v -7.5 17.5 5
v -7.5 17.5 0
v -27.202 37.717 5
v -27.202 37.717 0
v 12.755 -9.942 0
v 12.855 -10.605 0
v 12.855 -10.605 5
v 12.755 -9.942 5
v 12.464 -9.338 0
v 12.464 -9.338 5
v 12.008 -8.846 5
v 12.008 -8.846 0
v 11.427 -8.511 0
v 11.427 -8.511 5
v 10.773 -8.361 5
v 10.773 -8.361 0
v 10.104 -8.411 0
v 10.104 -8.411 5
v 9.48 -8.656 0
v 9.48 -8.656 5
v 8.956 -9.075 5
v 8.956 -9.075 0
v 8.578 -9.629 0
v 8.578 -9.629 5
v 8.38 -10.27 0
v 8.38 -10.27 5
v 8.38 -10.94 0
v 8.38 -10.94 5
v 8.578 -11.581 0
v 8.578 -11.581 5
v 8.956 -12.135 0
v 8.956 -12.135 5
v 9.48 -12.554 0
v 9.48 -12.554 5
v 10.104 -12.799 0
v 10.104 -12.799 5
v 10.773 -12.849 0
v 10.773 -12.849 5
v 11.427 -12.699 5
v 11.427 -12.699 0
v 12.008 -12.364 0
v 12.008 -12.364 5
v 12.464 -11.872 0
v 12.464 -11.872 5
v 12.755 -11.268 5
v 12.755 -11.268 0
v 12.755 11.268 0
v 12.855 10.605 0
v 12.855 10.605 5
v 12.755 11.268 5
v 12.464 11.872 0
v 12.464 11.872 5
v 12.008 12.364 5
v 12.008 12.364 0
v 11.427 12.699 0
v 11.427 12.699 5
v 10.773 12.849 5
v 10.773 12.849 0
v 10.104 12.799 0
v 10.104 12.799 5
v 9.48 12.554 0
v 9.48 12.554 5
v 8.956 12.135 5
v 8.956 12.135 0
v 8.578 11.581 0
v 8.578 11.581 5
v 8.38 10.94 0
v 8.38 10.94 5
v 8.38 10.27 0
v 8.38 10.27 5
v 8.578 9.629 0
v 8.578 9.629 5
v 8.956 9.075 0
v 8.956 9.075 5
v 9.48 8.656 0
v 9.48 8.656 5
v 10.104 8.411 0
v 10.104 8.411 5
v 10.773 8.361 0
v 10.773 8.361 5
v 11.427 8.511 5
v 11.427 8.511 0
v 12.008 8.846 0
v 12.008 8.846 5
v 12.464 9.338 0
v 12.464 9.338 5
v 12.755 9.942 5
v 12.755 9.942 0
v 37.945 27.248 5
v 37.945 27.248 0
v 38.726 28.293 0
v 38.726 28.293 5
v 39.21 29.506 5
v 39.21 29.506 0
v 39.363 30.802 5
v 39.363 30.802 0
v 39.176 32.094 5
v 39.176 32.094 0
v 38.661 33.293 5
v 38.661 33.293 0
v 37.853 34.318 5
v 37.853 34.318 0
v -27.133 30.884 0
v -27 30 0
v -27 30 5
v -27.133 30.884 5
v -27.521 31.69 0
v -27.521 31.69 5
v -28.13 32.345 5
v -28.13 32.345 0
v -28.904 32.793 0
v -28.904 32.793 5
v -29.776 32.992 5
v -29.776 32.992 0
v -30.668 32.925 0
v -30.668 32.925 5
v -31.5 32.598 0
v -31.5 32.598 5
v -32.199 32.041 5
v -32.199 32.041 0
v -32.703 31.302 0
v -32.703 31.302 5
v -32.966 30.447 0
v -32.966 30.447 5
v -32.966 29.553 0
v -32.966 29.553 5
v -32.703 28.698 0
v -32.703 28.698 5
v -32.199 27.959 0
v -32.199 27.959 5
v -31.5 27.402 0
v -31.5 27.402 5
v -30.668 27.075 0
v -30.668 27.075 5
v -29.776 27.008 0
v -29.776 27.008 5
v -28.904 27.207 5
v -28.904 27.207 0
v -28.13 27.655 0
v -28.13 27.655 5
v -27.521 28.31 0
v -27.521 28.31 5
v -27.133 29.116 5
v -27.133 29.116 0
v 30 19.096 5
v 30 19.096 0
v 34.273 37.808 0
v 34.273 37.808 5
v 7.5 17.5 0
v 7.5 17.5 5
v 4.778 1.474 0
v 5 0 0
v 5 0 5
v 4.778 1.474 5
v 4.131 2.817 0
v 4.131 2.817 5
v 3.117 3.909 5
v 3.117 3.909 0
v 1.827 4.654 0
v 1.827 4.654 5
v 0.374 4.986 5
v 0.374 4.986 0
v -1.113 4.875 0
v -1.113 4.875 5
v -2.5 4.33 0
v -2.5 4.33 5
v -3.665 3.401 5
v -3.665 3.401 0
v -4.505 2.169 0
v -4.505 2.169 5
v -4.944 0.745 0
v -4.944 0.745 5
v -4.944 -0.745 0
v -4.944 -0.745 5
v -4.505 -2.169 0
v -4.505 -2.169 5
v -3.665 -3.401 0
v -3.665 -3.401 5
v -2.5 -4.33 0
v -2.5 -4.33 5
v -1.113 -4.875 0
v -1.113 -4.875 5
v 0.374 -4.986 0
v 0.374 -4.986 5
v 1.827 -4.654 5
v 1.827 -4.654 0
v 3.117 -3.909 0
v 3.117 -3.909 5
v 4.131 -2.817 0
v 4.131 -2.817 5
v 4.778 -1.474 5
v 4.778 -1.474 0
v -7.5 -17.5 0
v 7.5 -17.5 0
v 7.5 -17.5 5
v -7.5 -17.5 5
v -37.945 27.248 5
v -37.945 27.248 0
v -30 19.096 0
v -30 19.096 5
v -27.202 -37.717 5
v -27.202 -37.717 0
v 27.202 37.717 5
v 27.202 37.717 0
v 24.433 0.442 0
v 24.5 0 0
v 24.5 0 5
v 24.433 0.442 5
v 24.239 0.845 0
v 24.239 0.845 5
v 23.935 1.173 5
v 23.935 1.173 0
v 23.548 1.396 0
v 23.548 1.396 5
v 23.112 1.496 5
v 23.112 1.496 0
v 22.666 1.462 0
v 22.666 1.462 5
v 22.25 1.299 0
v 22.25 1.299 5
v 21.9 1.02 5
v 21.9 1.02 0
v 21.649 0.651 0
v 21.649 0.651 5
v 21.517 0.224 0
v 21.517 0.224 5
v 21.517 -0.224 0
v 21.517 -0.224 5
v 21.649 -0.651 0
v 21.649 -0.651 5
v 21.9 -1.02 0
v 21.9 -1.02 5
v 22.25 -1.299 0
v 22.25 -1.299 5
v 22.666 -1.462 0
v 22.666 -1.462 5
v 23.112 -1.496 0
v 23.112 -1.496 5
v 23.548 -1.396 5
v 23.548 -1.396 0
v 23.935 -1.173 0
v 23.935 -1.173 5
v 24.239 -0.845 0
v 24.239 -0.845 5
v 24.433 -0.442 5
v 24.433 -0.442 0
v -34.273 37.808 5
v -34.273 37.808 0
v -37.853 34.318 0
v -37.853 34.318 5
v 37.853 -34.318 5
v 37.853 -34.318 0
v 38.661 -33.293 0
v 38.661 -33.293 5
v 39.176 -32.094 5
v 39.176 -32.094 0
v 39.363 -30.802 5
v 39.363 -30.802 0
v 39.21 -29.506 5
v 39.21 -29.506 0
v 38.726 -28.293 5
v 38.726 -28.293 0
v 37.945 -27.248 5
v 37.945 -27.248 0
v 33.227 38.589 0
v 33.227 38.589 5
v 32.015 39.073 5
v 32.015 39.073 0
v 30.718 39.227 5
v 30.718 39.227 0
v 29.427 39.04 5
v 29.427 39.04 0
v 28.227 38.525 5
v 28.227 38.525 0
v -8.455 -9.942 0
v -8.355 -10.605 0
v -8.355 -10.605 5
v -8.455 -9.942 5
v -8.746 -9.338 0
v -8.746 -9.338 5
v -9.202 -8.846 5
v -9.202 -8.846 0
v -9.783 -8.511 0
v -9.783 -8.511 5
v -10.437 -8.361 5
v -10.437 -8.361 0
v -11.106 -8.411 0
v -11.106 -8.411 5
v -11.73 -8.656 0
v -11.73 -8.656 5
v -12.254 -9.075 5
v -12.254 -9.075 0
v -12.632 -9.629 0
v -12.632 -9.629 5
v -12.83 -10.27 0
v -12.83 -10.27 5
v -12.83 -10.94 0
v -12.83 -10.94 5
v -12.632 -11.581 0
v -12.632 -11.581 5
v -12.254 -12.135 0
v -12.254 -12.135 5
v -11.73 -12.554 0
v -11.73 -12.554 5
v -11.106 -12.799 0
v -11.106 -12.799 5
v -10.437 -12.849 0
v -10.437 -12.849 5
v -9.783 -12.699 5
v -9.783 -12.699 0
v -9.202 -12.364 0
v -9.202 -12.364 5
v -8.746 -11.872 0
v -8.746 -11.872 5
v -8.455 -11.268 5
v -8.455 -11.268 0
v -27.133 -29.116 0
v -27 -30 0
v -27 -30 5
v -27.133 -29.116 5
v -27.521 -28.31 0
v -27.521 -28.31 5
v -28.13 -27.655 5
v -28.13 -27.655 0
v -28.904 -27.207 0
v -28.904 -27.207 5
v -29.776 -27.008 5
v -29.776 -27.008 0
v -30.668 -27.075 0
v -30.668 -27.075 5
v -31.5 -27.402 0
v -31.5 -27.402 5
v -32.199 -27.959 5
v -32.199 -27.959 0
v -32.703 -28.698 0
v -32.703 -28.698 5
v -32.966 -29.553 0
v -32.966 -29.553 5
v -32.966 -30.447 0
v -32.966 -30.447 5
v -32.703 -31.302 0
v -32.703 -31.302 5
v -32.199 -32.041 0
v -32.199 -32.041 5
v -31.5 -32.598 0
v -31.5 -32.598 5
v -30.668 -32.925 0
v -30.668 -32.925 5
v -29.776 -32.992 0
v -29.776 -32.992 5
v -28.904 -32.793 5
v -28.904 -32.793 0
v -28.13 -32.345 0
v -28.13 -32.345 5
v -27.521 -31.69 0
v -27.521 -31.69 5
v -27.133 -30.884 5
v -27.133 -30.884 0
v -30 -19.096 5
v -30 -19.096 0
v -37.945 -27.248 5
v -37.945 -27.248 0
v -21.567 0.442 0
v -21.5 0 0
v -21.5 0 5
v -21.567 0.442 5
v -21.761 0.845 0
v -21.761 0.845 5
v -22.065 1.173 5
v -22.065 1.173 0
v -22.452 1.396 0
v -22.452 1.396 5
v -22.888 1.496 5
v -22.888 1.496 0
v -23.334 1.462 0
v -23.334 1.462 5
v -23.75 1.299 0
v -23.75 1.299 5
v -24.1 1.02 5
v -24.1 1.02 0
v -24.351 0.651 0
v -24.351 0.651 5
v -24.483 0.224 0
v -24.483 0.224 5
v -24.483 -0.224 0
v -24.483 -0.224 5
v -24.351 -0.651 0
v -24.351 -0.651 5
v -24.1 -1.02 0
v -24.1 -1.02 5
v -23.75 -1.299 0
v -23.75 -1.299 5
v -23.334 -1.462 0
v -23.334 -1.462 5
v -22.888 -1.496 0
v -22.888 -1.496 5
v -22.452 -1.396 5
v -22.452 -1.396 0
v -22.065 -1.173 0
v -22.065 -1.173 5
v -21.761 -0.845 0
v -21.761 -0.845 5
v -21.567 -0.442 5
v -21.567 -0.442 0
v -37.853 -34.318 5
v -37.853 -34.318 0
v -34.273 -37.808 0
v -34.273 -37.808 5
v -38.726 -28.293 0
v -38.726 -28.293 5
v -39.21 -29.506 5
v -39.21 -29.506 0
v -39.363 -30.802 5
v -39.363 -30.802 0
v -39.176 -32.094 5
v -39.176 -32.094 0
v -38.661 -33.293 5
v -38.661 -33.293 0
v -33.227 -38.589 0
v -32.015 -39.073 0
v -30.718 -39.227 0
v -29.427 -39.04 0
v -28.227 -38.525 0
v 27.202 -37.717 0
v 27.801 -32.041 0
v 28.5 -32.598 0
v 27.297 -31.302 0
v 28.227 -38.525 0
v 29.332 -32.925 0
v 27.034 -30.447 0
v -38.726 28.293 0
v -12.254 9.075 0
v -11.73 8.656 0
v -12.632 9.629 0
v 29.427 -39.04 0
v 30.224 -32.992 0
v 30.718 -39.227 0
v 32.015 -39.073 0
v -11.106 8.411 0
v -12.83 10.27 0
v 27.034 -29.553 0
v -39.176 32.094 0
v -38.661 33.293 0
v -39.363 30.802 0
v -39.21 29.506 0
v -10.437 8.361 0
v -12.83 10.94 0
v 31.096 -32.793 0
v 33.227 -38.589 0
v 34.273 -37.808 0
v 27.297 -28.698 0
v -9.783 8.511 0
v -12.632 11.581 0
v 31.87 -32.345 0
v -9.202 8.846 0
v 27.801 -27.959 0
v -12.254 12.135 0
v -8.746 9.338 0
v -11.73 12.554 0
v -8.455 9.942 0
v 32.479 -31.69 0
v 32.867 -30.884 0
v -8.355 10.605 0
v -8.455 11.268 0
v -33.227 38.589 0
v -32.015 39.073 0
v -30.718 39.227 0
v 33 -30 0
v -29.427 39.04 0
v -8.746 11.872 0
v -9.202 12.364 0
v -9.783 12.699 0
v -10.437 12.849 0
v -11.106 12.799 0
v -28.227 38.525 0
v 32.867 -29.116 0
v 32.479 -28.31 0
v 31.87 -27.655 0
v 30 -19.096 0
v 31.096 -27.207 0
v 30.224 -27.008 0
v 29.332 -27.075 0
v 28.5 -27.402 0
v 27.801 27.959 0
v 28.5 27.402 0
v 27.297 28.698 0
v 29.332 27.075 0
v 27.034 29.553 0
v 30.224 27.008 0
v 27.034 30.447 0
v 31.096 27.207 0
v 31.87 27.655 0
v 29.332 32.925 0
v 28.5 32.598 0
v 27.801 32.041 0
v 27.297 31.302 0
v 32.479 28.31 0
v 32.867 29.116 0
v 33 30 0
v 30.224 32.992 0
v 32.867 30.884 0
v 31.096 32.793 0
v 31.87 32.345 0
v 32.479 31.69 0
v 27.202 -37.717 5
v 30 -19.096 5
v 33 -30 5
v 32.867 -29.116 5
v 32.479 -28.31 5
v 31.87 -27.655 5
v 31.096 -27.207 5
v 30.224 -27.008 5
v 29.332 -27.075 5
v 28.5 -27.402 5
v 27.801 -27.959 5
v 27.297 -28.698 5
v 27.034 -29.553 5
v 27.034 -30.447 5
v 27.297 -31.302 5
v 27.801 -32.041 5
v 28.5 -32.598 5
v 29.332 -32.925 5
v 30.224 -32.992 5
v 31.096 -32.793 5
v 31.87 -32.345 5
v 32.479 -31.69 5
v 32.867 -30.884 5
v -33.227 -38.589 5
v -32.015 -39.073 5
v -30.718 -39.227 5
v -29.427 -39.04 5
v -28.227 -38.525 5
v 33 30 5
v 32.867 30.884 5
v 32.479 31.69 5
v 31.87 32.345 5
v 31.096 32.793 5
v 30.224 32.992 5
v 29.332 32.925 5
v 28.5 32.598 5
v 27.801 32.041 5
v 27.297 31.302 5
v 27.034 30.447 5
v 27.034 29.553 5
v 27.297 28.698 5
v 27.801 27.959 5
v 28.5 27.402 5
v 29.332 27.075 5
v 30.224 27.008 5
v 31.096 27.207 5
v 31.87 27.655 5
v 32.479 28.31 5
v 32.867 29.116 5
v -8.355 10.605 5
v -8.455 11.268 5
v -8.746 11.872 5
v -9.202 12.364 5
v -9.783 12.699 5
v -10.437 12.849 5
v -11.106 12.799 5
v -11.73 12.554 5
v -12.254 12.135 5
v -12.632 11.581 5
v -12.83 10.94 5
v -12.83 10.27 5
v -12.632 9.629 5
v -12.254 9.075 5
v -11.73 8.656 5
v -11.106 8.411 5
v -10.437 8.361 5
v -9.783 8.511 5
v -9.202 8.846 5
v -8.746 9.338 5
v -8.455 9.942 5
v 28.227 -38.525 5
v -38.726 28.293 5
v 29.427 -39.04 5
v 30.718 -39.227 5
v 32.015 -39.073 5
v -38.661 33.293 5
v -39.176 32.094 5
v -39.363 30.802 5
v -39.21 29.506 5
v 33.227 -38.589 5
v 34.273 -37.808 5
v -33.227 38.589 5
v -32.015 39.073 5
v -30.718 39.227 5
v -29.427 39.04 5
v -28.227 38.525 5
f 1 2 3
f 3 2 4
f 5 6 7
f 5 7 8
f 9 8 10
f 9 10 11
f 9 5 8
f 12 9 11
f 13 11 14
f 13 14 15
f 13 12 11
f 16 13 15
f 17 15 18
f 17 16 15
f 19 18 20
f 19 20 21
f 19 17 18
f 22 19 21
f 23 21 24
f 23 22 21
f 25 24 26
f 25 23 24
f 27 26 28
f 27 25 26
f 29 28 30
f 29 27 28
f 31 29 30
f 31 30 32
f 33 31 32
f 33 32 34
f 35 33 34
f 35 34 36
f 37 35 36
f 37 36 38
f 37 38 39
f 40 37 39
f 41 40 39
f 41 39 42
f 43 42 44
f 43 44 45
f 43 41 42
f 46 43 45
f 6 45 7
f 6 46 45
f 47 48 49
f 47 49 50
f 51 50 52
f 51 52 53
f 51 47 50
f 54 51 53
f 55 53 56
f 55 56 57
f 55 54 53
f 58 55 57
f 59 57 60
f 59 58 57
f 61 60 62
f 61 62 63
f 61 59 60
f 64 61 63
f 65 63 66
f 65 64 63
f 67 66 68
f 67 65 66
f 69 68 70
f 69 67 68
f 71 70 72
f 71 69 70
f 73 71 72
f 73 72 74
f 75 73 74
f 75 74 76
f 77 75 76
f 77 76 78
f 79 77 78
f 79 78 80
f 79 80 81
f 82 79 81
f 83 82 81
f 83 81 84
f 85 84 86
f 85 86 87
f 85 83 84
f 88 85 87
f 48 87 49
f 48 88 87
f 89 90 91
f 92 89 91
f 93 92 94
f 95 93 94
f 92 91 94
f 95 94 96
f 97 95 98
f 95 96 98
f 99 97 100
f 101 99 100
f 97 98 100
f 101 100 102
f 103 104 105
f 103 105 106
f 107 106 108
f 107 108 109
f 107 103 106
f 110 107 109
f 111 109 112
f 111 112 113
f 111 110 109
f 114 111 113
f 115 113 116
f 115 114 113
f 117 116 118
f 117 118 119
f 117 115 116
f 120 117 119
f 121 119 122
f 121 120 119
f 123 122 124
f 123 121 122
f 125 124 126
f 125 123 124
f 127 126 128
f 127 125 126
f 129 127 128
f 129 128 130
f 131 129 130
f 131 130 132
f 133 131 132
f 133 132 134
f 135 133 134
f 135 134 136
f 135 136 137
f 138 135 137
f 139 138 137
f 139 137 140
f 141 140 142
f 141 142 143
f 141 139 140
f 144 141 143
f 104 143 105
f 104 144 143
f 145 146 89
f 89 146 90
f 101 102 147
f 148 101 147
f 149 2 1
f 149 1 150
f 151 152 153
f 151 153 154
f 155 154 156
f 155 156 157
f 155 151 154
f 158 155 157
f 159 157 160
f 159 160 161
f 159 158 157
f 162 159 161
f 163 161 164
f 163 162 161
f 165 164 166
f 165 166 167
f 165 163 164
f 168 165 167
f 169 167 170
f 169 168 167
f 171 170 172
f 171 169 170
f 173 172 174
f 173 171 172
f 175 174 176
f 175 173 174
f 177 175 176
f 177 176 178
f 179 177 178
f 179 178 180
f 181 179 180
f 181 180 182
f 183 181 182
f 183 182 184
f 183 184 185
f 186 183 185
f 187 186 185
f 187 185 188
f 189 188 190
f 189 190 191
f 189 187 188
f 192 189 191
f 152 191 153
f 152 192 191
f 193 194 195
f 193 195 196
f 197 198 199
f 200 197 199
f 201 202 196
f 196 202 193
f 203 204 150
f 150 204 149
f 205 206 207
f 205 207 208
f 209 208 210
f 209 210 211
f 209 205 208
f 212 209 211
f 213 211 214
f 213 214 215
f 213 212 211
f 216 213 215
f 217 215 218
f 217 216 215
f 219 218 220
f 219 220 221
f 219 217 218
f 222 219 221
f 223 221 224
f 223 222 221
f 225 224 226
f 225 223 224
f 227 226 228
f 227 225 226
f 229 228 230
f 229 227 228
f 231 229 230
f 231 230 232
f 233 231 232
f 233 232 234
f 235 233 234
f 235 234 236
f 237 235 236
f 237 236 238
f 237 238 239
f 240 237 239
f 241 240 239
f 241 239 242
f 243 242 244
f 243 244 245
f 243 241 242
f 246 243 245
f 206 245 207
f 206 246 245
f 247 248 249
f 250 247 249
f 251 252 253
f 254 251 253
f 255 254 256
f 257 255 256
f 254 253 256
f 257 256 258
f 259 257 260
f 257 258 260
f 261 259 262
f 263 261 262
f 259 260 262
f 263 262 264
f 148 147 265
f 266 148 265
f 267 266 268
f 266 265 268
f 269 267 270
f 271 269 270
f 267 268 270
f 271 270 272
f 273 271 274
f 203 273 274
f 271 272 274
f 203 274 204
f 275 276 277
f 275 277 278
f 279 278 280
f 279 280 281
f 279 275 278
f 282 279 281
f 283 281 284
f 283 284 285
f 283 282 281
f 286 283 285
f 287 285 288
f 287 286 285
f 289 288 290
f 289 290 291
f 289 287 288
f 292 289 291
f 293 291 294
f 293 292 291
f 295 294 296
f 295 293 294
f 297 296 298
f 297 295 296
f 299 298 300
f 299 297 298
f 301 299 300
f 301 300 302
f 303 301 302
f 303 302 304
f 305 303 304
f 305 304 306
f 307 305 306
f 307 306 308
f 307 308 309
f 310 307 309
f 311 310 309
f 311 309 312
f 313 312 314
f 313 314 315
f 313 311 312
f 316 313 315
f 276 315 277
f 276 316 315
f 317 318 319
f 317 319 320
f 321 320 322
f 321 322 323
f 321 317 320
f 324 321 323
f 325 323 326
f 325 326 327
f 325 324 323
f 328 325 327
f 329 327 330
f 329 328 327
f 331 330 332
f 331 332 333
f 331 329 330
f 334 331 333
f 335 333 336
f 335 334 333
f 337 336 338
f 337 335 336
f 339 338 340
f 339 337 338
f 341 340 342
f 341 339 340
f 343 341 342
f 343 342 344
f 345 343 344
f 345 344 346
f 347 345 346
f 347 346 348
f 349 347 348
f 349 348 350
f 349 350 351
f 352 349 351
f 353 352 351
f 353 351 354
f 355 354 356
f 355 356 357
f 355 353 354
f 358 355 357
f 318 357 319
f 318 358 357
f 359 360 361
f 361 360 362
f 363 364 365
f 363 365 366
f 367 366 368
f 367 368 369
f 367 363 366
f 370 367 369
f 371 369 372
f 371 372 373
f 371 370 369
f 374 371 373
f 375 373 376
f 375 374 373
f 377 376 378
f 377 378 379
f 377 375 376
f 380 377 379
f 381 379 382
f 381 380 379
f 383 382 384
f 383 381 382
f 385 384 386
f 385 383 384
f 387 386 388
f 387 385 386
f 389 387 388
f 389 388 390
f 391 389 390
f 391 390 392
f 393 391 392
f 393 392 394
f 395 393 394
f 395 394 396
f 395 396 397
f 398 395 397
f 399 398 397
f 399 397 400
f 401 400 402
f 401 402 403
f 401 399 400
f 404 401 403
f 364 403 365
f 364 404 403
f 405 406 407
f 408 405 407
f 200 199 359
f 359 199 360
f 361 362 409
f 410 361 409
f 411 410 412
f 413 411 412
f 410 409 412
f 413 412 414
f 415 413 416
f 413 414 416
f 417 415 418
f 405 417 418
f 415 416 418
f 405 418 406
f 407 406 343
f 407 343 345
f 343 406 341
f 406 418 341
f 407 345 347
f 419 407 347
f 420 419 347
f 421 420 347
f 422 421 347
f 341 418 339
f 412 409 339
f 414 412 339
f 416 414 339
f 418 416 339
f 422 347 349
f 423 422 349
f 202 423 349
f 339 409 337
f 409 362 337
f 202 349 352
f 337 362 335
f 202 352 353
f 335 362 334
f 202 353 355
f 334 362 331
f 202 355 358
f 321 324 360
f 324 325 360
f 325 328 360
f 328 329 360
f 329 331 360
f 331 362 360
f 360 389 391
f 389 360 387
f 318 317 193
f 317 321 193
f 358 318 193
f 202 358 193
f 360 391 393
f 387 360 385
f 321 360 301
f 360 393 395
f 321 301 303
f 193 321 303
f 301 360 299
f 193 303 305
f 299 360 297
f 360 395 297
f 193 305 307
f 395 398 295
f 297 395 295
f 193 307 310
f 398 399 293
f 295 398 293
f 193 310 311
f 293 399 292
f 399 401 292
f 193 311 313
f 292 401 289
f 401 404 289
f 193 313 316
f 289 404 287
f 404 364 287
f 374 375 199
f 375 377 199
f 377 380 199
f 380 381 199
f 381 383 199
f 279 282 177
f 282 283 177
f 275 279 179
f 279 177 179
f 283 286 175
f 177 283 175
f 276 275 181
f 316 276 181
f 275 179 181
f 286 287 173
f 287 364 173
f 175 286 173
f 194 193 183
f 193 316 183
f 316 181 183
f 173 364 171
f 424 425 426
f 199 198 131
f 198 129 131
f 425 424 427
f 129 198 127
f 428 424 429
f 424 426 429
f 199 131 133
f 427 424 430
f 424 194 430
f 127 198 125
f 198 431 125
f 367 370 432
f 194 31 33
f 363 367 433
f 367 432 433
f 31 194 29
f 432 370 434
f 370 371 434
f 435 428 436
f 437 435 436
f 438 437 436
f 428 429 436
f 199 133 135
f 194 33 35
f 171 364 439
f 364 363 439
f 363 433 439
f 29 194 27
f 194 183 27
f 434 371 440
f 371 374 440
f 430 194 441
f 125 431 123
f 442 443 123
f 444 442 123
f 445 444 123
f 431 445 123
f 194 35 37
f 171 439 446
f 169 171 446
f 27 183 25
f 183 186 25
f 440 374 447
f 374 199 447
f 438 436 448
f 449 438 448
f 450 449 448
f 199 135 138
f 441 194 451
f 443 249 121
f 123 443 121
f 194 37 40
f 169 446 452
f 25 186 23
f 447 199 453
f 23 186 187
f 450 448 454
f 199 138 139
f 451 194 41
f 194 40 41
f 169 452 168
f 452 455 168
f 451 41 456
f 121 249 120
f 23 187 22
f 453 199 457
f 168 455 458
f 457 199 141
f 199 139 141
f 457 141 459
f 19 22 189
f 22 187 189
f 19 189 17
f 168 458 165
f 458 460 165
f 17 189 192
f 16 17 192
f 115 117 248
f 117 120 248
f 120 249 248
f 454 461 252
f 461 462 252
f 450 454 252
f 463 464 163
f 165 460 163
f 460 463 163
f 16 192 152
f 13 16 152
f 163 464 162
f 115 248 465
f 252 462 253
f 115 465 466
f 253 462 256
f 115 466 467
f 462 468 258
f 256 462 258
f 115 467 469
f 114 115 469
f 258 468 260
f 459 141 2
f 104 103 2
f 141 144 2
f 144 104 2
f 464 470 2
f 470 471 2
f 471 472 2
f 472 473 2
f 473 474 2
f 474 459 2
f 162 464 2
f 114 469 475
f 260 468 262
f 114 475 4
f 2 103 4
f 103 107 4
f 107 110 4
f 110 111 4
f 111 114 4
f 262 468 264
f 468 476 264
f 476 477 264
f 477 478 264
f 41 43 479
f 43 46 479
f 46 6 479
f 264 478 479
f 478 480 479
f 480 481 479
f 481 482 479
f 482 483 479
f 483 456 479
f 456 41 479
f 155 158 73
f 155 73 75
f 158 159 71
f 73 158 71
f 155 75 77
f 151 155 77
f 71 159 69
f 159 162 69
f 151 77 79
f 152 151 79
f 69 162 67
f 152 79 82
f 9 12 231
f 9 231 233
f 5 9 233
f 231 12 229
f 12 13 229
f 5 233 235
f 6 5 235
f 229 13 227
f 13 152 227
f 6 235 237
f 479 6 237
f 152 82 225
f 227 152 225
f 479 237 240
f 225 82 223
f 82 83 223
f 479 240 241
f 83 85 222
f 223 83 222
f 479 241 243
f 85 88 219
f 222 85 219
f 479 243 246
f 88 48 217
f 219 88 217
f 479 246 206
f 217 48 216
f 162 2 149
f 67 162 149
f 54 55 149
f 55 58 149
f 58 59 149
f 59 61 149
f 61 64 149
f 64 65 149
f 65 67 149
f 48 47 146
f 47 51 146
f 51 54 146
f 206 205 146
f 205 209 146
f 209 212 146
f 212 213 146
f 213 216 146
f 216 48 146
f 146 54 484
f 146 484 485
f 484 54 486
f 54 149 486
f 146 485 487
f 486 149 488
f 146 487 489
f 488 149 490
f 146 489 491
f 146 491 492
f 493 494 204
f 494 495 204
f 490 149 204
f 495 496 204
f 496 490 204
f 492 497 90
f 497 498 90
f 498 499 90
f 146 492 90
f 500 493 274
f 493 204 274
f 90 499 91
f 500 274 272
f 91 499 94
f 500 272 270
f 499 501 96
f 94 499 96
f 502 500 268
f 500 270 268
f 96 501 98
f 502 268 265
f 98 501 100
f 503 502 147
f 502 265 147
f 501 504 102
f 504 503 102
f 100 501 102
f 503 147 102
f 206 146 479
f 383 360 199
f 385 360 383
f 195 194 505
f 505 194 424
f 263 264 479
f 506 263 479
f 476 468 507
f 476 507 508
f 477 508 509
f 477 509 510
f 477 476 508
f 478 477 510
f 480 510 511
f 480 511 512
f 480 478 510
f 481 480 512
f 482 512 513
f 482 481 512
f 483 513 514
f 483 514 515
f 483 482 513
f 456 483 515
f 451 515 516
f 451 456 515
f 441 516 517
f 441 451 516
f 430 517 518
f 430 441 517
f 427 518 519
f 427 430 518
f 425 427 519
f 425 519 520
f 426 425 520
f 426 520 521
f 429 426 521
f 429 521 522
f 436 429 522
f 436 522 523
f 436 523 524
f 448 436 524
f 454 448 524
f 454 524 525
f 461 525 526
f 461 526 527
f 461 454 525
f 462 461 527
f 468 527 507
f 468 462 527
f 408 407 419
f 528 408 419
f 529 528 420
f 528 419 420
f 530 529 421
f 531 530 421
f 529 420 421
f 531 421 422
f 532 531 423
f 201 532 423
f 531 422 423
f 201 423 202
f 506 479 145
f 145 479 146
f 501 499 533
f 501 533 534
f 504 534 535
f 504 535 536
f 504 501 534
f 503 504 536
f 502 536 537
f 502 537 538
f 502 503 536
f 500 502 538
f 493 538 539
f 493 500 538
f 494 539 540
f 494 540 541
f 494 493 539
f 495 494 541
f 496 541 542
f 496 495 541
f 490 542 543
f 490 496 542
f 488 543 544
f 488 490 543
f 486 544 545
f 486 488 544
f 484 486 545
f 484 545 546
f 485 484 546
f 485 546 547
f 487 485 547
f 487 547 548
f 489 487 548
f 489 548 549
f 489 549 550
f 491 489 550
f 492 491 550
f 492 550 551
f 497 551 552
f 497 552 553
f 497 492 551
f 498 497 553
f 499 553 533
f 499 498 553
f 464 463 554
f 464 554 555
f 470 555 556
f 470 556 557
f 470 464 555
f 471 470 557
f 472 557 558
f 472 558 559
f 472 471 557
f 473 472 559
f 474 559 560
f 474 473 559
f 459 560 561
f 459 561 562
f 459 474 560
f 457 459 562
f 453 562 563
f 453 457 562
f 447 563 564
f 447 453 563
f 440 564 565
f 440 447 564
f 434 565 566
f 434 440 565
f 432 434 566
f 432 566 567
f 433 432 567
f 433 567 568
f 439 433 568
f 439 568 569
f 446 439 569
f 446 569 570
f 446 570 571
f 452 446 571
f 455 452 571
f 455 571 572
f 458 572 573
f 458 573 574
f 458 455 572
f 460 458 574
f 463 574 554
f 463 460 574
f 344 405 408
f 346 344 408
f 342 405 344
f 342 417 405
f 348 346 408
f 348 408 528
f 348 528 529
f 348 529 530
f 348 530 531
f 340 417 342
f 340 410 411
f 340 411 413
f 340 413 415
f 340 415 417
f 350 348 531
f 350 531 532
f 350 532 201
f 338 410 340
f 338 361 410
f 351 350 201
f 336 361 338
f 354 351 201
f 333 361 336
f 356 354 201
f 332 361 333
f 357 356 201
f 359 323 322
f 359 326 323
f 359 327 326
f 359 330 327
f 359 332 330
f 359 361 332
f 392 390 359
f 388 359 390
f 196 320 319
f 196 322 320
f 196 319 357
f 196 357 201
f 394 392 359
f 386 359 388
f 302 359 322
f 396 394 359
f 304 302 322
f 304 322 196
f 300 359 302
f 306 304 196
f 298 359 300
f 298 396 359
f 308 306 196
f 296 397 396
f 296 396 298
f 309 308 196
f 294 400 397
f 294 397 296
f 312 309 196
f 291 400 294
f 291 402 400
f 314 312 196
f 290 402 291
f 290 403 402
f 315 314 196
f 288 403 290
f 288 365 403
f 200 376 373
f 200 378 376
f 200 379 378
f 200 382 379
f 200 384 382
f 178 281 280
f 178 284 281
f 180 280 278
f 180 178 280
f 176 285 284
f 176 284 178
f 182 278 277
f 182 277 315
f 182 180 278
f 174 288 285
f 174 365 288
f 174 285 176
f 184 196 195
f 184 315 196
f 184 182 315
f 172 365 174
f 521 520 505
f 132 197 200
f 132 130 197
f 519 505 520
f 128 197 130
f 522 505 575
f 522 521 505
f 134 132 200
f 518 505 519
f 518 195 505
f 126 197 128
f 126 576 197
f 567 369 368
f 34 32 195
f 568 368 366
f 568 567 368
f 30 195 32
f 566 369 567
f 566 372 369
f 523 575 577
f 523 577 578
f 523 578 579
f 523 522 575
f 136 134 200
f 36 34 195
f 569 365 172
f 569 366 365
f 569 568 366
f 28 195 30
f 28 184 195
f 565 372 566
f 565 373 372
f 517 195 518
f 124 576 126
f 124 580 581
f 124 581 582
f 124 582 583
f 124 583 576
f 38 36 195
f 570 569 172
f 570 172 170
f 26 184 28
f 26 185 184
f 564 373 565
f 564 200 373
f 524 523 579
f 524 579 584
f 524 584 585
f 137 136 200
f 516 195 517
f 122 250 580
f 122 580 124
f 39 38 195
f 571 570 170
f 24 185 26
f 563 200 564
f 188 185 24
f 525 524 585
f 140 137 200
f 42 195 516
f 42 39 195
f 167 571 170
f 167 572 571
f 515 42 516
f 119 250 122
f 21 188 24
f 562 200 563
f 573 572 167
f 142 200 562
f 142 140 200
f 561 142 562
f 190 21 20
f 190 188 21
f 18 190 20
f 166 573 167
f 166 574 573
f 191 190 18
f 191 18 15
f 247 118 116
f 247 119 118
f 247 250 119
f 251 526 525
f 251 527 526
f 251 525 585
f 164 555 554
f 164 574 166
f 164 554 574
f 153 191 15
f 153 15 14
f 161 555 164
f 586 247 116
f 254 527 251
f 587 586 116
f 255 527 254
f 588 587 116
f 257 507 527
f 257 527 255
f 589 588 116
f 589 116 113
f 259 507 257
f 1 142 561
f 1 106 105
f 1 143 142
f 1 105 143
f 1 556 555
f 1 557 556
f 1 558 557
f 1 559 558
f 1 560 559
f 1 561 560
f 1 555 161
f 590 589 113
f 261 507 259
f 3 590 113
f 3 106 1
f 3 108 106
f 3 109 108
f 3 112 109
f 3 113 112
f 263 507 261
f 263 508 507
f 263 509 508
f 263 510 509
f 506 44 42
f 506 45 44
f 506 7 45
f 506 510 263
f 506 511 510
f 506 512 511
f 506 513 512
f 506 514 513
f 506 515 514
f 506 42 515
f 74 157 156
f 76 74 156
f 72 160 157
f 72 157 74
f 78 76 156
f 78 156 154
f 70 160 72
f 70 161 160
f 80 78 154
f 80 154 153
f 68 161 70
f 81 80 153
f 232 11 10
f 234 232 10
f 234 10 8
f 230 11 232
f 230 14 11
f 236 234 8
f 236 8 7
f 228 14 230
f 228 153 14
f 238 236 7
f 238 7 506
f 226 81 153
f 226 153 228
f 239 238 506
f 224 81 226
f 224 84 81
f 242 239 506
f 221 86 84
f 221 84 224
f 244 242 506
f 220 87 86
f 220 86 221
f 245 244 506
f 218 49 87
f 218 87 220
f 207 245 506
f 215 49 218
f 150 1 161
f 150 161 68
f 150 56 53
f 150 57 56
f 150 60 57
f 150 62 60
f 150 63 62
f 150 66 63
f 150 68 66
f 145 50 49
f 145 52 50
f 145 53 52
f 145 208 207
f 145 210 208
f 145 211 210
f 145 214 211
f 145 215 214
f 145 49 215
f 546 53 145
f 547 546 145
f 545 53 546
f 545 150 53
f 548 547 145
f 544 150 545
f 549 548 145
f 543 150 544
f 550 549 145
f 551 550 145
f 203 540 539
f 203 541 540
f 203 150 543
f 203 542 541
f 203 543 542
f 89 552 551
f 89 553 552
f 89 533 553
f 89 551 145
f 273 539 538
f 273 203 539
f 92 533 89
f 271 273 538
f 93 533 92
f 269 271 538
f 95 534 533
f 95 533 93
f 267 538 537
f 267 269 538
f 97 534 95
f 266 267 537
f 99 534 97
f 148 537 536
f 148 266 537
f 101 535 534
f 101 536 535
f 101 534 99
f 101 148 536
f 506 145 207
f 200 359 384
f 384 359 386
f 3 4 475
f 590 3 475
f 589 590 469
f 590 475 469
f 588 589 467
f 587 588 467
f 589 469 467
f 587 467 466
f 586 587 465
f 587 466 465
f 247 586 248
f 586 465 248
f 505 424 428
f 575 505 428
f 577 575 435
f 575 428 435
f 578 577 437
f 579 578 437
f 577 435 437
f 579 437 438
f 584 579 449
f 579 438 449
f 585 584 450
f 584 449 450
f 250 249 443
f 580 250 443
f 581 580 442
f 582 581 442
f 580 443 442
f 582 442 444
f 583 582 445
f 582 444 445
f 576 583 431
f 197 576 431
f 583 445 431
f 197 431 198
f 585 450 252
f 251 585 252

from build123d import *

# Parameters (mm, degrees)
ESQUISSE1_R        = 8
ESQUISSE1_R_2      = 2.25
BOSS_EXTRU_1_DEPTH = 5
BOSS_EXTRU_2_START = -5
ESQUISSE2_R        = 3
BOSS_EXTRU_2_DEPTH = 5
BOSS_EXTRU_3_START = -5
ESQUISSE3_R        = 1.5
ESQUISSE3_R_2      = 8
ESQUISSE3_R_3      = 5
BOSS_EXTRU_3_DEPTH = 5


with BuildPart() as part:
    # Esquisse1 → Boss.-Extru.1 (new body)
    with BuildSketch(Plane.XY):
        with BuildLine():
            Line((7.5, -17.5), (-7.5, -17.5))
            ThreePointArc((-7.5, -17.5), (-14.571067812, -14.571067812), (-17.5, -7.5))
            Line((-17.5, -7.5), (-17.5, 7.5))
            ThreePointArc((-17.5, 7.5), (-14.571067812, 14.571067812), (-7.5, 17.5))
            Line((-7.5, 17.5), (7.5, 17.5))
            ThreePointArc((7.5, 17.5), (14.571067812, 14.571067812), (17.5, 7.5))
            Line((17.5, 7.5), (17.5, -7.5))
            ThreePointArc((17.5, -7.5), (14.571067812, -14.571067812), (7.5, -17.5))
        make_face()
        Circle(ESQUISSE1_R, mode=Mode.SUBTRACT)
        with Locations((-10.605, 10.605)):
            Circle(ESQUISSE1_R_2, mode=Mode.SUBTRACT)
        with Locations((10.605, 10.605)):
            Circle(ESQUISSE1_R_2, mode=Mode.SUBTRACT)
        with Locations((-10.605, -10.605)):
            Circle(ESQUISSE1_R_2, mode=Mode.SUBTRACT)
        with Locations((10.605, -10.605)):
            Circle(ESQUISSE1_R_2, mode=Mode.SUBTRACT)
    extrude(amount=BOSS_EXTRU_1_DEPTH)

    # Esquisse2 → Boss.-Extru.2 (add)
    # profile 1 of 4: a face of its own
    with BuildSketch(Plane.XY.offset(5).offset(BOSS_EXTRU_2_START)):
        with BuildLine():
            Line((-37.944507823, 27.247644267), (-17.5, 6.269167951))
            Line((-17.5, 6.269167951), (-17.5, 7.5))
            ThreePointArc((-17.5, 7.5), (-14.571067812, 14.571067812), (-7.5, 17.5))
            Line((-7.5, 17.5), (-27.202072783, 37.7166504))
            ThreePointArc((-27.202072783, 37.7166504), (-30.718436651, 39.22656632), (-34.272553174, 37.807793369))
            Line((-34.272553174, 37.807793369), (-37.853364854, 34.318124658))
            ThreePointArc((-37.853364854, 34.318124658), (-39.363280773, 30.80176079), (-37.944507823, 27.247644267))
        make_face()
        with Locations((-30, 30)):
            Circle(ESQUISSE2_R, mode=Mode.SUBTRACT)
    # profile 2 of 4: a face of its own
    with BuildSketch(Plane.XY.offset(5).offset(BOSS_EXTRU_2_START)):
        with BuildLine():
            ThreePointArc((37.944507823, 27.247644267), (39.363280773, 30.80176079), (37.853364854, 34.318124658))
            Line((37.853364854, 34.318124658), (34.272553174, 37.807793369))
            ThreePointArc((34.272553174, 37.807793369), (30.718436651, 39.22656632), (27.202072783, 37.7166504))
            Line((27.202072783, 37.7166504), (7.5, 17.5))
            ThreePointArc((7.5, 17.5), (14.571067812, 14.571067812), (17.5, 7.5))
            Line((17.5, 7.5), (17.5, 6.269167951))
            Line((17.5, 6.269167951), (37.944507823, 27.247644267))
        make_face()
        with Locations((30, 30)):
            Circle(ESQUISSE2_R, mode=Mode.SUBTRACT)
    # profile 3 of 4: a face of its own
    with BuildSketch(Plane.XY.offset(5).offset(BOSS_EXTRU_2_START)):
        with BuildLine():
            Line((37.944507823, -27.247644267), (17.5, -6.269167951))
            Line((17.5, -6.269167951), (17.5, -7.5))
            ThreePointArc((17.5, -7.5), (14.571067812, -14.571067812), (7.5, -17.5))
            Line((7.5, -17.5), (27.202072783, -37.7166504))
            ThreePointArc((27.202072783, -37.7166504), (30.718436651, -39.22656632), (34.272553174, -37.807793369))
            Line((34.272553174, -37.807793369), (37.853364854, -34.318124658))
            ThreePointArc((37.853364854, -34.318124658), (39.363280773, -30.80176079), (37.944507823, -27.247644267))
        make_face()
        with Locations((30, -30)):
            Circle(ESQUISSE2_R, mode=Mode.SUBTRACT)
    # profile 4 of 4: a face of its own
    with BuildSketch(Plane.XY.offset(5).offset(BOSS_EXTRU_2_START)):
        with BuildLine():
            Line((-17.5, -7.5), (-17.5, -6.269167951))
            Line((-17.5, -6.269167951), (-37.944507823, -27.247644267))
            ThreePointArc((-37.944507823, -27.247644267), (-39.363280773, -30.80176079), (-37.853364854, -34.318124658))
            Line((-37.853364854, -34.318124658), (-34.272553174, -37.807793369))
            ThreePointArc((-34.272553174, -37.807793369), (-30.718436651, -39.22656632), (-27.202072783, -37.7166504))
            Line((-27.202072783, -37.7166504), (-7.5, -17.5))
            ThreePointArc((-7.5, -17.5), (-14.571067812, -14.571067812), (-17.5, -7.5))
        make_face()
        with Locations((-30, -30)):
            Circle(ESQUISSE2_R, mode=Mode.SUBTRACT)
    extrude(amount=BOSS_EXTRU_2_DEPTH)

    # Esquisse3 → Boss.-Extru.3 (add)
    # profile 1 of 3: a face of its own
    with BuildSketch(Plane.XY.offset(5).offset(BOSS_EXTRU_3_START)):
        Polygon((17.5, 6.269167951), (17.5, -6.269167951), (30, -19.095642241), (30, 19.095642241), align=None)
        with Locations((23, 0)):
            Circle(ESQUISSE3_R, mode=Mode.SUBTRACT)
    # profile 2 of 3: a face of its own
    with BuildSketch(Plane.XY.offset(5).offset(BOSS_EXTRU_3_START)):
        Polygon((-30, -19.095642241), (-17.5, -6.269167951), (-17.5, 6.269167951), (-30, 19.095642241), align=None)
        with Locations((-23, 0)):
            Circle(ESQUISSE3_R, mode=Mode.SUBTRACT)
    # profile 3 of 3: a face of its own
    with BuildSketch(Plane.XY.offset(5).offset(BOSS_EXTRU_3_START)):
        Circle(ESQUISSE3_R_2)
        Circle(ESQUISSE3_R_3, mode=Mode.SUBTRACT)
    extrude(amount=BOSS_EXTRU_3_DEPTH)


solid = part.part
